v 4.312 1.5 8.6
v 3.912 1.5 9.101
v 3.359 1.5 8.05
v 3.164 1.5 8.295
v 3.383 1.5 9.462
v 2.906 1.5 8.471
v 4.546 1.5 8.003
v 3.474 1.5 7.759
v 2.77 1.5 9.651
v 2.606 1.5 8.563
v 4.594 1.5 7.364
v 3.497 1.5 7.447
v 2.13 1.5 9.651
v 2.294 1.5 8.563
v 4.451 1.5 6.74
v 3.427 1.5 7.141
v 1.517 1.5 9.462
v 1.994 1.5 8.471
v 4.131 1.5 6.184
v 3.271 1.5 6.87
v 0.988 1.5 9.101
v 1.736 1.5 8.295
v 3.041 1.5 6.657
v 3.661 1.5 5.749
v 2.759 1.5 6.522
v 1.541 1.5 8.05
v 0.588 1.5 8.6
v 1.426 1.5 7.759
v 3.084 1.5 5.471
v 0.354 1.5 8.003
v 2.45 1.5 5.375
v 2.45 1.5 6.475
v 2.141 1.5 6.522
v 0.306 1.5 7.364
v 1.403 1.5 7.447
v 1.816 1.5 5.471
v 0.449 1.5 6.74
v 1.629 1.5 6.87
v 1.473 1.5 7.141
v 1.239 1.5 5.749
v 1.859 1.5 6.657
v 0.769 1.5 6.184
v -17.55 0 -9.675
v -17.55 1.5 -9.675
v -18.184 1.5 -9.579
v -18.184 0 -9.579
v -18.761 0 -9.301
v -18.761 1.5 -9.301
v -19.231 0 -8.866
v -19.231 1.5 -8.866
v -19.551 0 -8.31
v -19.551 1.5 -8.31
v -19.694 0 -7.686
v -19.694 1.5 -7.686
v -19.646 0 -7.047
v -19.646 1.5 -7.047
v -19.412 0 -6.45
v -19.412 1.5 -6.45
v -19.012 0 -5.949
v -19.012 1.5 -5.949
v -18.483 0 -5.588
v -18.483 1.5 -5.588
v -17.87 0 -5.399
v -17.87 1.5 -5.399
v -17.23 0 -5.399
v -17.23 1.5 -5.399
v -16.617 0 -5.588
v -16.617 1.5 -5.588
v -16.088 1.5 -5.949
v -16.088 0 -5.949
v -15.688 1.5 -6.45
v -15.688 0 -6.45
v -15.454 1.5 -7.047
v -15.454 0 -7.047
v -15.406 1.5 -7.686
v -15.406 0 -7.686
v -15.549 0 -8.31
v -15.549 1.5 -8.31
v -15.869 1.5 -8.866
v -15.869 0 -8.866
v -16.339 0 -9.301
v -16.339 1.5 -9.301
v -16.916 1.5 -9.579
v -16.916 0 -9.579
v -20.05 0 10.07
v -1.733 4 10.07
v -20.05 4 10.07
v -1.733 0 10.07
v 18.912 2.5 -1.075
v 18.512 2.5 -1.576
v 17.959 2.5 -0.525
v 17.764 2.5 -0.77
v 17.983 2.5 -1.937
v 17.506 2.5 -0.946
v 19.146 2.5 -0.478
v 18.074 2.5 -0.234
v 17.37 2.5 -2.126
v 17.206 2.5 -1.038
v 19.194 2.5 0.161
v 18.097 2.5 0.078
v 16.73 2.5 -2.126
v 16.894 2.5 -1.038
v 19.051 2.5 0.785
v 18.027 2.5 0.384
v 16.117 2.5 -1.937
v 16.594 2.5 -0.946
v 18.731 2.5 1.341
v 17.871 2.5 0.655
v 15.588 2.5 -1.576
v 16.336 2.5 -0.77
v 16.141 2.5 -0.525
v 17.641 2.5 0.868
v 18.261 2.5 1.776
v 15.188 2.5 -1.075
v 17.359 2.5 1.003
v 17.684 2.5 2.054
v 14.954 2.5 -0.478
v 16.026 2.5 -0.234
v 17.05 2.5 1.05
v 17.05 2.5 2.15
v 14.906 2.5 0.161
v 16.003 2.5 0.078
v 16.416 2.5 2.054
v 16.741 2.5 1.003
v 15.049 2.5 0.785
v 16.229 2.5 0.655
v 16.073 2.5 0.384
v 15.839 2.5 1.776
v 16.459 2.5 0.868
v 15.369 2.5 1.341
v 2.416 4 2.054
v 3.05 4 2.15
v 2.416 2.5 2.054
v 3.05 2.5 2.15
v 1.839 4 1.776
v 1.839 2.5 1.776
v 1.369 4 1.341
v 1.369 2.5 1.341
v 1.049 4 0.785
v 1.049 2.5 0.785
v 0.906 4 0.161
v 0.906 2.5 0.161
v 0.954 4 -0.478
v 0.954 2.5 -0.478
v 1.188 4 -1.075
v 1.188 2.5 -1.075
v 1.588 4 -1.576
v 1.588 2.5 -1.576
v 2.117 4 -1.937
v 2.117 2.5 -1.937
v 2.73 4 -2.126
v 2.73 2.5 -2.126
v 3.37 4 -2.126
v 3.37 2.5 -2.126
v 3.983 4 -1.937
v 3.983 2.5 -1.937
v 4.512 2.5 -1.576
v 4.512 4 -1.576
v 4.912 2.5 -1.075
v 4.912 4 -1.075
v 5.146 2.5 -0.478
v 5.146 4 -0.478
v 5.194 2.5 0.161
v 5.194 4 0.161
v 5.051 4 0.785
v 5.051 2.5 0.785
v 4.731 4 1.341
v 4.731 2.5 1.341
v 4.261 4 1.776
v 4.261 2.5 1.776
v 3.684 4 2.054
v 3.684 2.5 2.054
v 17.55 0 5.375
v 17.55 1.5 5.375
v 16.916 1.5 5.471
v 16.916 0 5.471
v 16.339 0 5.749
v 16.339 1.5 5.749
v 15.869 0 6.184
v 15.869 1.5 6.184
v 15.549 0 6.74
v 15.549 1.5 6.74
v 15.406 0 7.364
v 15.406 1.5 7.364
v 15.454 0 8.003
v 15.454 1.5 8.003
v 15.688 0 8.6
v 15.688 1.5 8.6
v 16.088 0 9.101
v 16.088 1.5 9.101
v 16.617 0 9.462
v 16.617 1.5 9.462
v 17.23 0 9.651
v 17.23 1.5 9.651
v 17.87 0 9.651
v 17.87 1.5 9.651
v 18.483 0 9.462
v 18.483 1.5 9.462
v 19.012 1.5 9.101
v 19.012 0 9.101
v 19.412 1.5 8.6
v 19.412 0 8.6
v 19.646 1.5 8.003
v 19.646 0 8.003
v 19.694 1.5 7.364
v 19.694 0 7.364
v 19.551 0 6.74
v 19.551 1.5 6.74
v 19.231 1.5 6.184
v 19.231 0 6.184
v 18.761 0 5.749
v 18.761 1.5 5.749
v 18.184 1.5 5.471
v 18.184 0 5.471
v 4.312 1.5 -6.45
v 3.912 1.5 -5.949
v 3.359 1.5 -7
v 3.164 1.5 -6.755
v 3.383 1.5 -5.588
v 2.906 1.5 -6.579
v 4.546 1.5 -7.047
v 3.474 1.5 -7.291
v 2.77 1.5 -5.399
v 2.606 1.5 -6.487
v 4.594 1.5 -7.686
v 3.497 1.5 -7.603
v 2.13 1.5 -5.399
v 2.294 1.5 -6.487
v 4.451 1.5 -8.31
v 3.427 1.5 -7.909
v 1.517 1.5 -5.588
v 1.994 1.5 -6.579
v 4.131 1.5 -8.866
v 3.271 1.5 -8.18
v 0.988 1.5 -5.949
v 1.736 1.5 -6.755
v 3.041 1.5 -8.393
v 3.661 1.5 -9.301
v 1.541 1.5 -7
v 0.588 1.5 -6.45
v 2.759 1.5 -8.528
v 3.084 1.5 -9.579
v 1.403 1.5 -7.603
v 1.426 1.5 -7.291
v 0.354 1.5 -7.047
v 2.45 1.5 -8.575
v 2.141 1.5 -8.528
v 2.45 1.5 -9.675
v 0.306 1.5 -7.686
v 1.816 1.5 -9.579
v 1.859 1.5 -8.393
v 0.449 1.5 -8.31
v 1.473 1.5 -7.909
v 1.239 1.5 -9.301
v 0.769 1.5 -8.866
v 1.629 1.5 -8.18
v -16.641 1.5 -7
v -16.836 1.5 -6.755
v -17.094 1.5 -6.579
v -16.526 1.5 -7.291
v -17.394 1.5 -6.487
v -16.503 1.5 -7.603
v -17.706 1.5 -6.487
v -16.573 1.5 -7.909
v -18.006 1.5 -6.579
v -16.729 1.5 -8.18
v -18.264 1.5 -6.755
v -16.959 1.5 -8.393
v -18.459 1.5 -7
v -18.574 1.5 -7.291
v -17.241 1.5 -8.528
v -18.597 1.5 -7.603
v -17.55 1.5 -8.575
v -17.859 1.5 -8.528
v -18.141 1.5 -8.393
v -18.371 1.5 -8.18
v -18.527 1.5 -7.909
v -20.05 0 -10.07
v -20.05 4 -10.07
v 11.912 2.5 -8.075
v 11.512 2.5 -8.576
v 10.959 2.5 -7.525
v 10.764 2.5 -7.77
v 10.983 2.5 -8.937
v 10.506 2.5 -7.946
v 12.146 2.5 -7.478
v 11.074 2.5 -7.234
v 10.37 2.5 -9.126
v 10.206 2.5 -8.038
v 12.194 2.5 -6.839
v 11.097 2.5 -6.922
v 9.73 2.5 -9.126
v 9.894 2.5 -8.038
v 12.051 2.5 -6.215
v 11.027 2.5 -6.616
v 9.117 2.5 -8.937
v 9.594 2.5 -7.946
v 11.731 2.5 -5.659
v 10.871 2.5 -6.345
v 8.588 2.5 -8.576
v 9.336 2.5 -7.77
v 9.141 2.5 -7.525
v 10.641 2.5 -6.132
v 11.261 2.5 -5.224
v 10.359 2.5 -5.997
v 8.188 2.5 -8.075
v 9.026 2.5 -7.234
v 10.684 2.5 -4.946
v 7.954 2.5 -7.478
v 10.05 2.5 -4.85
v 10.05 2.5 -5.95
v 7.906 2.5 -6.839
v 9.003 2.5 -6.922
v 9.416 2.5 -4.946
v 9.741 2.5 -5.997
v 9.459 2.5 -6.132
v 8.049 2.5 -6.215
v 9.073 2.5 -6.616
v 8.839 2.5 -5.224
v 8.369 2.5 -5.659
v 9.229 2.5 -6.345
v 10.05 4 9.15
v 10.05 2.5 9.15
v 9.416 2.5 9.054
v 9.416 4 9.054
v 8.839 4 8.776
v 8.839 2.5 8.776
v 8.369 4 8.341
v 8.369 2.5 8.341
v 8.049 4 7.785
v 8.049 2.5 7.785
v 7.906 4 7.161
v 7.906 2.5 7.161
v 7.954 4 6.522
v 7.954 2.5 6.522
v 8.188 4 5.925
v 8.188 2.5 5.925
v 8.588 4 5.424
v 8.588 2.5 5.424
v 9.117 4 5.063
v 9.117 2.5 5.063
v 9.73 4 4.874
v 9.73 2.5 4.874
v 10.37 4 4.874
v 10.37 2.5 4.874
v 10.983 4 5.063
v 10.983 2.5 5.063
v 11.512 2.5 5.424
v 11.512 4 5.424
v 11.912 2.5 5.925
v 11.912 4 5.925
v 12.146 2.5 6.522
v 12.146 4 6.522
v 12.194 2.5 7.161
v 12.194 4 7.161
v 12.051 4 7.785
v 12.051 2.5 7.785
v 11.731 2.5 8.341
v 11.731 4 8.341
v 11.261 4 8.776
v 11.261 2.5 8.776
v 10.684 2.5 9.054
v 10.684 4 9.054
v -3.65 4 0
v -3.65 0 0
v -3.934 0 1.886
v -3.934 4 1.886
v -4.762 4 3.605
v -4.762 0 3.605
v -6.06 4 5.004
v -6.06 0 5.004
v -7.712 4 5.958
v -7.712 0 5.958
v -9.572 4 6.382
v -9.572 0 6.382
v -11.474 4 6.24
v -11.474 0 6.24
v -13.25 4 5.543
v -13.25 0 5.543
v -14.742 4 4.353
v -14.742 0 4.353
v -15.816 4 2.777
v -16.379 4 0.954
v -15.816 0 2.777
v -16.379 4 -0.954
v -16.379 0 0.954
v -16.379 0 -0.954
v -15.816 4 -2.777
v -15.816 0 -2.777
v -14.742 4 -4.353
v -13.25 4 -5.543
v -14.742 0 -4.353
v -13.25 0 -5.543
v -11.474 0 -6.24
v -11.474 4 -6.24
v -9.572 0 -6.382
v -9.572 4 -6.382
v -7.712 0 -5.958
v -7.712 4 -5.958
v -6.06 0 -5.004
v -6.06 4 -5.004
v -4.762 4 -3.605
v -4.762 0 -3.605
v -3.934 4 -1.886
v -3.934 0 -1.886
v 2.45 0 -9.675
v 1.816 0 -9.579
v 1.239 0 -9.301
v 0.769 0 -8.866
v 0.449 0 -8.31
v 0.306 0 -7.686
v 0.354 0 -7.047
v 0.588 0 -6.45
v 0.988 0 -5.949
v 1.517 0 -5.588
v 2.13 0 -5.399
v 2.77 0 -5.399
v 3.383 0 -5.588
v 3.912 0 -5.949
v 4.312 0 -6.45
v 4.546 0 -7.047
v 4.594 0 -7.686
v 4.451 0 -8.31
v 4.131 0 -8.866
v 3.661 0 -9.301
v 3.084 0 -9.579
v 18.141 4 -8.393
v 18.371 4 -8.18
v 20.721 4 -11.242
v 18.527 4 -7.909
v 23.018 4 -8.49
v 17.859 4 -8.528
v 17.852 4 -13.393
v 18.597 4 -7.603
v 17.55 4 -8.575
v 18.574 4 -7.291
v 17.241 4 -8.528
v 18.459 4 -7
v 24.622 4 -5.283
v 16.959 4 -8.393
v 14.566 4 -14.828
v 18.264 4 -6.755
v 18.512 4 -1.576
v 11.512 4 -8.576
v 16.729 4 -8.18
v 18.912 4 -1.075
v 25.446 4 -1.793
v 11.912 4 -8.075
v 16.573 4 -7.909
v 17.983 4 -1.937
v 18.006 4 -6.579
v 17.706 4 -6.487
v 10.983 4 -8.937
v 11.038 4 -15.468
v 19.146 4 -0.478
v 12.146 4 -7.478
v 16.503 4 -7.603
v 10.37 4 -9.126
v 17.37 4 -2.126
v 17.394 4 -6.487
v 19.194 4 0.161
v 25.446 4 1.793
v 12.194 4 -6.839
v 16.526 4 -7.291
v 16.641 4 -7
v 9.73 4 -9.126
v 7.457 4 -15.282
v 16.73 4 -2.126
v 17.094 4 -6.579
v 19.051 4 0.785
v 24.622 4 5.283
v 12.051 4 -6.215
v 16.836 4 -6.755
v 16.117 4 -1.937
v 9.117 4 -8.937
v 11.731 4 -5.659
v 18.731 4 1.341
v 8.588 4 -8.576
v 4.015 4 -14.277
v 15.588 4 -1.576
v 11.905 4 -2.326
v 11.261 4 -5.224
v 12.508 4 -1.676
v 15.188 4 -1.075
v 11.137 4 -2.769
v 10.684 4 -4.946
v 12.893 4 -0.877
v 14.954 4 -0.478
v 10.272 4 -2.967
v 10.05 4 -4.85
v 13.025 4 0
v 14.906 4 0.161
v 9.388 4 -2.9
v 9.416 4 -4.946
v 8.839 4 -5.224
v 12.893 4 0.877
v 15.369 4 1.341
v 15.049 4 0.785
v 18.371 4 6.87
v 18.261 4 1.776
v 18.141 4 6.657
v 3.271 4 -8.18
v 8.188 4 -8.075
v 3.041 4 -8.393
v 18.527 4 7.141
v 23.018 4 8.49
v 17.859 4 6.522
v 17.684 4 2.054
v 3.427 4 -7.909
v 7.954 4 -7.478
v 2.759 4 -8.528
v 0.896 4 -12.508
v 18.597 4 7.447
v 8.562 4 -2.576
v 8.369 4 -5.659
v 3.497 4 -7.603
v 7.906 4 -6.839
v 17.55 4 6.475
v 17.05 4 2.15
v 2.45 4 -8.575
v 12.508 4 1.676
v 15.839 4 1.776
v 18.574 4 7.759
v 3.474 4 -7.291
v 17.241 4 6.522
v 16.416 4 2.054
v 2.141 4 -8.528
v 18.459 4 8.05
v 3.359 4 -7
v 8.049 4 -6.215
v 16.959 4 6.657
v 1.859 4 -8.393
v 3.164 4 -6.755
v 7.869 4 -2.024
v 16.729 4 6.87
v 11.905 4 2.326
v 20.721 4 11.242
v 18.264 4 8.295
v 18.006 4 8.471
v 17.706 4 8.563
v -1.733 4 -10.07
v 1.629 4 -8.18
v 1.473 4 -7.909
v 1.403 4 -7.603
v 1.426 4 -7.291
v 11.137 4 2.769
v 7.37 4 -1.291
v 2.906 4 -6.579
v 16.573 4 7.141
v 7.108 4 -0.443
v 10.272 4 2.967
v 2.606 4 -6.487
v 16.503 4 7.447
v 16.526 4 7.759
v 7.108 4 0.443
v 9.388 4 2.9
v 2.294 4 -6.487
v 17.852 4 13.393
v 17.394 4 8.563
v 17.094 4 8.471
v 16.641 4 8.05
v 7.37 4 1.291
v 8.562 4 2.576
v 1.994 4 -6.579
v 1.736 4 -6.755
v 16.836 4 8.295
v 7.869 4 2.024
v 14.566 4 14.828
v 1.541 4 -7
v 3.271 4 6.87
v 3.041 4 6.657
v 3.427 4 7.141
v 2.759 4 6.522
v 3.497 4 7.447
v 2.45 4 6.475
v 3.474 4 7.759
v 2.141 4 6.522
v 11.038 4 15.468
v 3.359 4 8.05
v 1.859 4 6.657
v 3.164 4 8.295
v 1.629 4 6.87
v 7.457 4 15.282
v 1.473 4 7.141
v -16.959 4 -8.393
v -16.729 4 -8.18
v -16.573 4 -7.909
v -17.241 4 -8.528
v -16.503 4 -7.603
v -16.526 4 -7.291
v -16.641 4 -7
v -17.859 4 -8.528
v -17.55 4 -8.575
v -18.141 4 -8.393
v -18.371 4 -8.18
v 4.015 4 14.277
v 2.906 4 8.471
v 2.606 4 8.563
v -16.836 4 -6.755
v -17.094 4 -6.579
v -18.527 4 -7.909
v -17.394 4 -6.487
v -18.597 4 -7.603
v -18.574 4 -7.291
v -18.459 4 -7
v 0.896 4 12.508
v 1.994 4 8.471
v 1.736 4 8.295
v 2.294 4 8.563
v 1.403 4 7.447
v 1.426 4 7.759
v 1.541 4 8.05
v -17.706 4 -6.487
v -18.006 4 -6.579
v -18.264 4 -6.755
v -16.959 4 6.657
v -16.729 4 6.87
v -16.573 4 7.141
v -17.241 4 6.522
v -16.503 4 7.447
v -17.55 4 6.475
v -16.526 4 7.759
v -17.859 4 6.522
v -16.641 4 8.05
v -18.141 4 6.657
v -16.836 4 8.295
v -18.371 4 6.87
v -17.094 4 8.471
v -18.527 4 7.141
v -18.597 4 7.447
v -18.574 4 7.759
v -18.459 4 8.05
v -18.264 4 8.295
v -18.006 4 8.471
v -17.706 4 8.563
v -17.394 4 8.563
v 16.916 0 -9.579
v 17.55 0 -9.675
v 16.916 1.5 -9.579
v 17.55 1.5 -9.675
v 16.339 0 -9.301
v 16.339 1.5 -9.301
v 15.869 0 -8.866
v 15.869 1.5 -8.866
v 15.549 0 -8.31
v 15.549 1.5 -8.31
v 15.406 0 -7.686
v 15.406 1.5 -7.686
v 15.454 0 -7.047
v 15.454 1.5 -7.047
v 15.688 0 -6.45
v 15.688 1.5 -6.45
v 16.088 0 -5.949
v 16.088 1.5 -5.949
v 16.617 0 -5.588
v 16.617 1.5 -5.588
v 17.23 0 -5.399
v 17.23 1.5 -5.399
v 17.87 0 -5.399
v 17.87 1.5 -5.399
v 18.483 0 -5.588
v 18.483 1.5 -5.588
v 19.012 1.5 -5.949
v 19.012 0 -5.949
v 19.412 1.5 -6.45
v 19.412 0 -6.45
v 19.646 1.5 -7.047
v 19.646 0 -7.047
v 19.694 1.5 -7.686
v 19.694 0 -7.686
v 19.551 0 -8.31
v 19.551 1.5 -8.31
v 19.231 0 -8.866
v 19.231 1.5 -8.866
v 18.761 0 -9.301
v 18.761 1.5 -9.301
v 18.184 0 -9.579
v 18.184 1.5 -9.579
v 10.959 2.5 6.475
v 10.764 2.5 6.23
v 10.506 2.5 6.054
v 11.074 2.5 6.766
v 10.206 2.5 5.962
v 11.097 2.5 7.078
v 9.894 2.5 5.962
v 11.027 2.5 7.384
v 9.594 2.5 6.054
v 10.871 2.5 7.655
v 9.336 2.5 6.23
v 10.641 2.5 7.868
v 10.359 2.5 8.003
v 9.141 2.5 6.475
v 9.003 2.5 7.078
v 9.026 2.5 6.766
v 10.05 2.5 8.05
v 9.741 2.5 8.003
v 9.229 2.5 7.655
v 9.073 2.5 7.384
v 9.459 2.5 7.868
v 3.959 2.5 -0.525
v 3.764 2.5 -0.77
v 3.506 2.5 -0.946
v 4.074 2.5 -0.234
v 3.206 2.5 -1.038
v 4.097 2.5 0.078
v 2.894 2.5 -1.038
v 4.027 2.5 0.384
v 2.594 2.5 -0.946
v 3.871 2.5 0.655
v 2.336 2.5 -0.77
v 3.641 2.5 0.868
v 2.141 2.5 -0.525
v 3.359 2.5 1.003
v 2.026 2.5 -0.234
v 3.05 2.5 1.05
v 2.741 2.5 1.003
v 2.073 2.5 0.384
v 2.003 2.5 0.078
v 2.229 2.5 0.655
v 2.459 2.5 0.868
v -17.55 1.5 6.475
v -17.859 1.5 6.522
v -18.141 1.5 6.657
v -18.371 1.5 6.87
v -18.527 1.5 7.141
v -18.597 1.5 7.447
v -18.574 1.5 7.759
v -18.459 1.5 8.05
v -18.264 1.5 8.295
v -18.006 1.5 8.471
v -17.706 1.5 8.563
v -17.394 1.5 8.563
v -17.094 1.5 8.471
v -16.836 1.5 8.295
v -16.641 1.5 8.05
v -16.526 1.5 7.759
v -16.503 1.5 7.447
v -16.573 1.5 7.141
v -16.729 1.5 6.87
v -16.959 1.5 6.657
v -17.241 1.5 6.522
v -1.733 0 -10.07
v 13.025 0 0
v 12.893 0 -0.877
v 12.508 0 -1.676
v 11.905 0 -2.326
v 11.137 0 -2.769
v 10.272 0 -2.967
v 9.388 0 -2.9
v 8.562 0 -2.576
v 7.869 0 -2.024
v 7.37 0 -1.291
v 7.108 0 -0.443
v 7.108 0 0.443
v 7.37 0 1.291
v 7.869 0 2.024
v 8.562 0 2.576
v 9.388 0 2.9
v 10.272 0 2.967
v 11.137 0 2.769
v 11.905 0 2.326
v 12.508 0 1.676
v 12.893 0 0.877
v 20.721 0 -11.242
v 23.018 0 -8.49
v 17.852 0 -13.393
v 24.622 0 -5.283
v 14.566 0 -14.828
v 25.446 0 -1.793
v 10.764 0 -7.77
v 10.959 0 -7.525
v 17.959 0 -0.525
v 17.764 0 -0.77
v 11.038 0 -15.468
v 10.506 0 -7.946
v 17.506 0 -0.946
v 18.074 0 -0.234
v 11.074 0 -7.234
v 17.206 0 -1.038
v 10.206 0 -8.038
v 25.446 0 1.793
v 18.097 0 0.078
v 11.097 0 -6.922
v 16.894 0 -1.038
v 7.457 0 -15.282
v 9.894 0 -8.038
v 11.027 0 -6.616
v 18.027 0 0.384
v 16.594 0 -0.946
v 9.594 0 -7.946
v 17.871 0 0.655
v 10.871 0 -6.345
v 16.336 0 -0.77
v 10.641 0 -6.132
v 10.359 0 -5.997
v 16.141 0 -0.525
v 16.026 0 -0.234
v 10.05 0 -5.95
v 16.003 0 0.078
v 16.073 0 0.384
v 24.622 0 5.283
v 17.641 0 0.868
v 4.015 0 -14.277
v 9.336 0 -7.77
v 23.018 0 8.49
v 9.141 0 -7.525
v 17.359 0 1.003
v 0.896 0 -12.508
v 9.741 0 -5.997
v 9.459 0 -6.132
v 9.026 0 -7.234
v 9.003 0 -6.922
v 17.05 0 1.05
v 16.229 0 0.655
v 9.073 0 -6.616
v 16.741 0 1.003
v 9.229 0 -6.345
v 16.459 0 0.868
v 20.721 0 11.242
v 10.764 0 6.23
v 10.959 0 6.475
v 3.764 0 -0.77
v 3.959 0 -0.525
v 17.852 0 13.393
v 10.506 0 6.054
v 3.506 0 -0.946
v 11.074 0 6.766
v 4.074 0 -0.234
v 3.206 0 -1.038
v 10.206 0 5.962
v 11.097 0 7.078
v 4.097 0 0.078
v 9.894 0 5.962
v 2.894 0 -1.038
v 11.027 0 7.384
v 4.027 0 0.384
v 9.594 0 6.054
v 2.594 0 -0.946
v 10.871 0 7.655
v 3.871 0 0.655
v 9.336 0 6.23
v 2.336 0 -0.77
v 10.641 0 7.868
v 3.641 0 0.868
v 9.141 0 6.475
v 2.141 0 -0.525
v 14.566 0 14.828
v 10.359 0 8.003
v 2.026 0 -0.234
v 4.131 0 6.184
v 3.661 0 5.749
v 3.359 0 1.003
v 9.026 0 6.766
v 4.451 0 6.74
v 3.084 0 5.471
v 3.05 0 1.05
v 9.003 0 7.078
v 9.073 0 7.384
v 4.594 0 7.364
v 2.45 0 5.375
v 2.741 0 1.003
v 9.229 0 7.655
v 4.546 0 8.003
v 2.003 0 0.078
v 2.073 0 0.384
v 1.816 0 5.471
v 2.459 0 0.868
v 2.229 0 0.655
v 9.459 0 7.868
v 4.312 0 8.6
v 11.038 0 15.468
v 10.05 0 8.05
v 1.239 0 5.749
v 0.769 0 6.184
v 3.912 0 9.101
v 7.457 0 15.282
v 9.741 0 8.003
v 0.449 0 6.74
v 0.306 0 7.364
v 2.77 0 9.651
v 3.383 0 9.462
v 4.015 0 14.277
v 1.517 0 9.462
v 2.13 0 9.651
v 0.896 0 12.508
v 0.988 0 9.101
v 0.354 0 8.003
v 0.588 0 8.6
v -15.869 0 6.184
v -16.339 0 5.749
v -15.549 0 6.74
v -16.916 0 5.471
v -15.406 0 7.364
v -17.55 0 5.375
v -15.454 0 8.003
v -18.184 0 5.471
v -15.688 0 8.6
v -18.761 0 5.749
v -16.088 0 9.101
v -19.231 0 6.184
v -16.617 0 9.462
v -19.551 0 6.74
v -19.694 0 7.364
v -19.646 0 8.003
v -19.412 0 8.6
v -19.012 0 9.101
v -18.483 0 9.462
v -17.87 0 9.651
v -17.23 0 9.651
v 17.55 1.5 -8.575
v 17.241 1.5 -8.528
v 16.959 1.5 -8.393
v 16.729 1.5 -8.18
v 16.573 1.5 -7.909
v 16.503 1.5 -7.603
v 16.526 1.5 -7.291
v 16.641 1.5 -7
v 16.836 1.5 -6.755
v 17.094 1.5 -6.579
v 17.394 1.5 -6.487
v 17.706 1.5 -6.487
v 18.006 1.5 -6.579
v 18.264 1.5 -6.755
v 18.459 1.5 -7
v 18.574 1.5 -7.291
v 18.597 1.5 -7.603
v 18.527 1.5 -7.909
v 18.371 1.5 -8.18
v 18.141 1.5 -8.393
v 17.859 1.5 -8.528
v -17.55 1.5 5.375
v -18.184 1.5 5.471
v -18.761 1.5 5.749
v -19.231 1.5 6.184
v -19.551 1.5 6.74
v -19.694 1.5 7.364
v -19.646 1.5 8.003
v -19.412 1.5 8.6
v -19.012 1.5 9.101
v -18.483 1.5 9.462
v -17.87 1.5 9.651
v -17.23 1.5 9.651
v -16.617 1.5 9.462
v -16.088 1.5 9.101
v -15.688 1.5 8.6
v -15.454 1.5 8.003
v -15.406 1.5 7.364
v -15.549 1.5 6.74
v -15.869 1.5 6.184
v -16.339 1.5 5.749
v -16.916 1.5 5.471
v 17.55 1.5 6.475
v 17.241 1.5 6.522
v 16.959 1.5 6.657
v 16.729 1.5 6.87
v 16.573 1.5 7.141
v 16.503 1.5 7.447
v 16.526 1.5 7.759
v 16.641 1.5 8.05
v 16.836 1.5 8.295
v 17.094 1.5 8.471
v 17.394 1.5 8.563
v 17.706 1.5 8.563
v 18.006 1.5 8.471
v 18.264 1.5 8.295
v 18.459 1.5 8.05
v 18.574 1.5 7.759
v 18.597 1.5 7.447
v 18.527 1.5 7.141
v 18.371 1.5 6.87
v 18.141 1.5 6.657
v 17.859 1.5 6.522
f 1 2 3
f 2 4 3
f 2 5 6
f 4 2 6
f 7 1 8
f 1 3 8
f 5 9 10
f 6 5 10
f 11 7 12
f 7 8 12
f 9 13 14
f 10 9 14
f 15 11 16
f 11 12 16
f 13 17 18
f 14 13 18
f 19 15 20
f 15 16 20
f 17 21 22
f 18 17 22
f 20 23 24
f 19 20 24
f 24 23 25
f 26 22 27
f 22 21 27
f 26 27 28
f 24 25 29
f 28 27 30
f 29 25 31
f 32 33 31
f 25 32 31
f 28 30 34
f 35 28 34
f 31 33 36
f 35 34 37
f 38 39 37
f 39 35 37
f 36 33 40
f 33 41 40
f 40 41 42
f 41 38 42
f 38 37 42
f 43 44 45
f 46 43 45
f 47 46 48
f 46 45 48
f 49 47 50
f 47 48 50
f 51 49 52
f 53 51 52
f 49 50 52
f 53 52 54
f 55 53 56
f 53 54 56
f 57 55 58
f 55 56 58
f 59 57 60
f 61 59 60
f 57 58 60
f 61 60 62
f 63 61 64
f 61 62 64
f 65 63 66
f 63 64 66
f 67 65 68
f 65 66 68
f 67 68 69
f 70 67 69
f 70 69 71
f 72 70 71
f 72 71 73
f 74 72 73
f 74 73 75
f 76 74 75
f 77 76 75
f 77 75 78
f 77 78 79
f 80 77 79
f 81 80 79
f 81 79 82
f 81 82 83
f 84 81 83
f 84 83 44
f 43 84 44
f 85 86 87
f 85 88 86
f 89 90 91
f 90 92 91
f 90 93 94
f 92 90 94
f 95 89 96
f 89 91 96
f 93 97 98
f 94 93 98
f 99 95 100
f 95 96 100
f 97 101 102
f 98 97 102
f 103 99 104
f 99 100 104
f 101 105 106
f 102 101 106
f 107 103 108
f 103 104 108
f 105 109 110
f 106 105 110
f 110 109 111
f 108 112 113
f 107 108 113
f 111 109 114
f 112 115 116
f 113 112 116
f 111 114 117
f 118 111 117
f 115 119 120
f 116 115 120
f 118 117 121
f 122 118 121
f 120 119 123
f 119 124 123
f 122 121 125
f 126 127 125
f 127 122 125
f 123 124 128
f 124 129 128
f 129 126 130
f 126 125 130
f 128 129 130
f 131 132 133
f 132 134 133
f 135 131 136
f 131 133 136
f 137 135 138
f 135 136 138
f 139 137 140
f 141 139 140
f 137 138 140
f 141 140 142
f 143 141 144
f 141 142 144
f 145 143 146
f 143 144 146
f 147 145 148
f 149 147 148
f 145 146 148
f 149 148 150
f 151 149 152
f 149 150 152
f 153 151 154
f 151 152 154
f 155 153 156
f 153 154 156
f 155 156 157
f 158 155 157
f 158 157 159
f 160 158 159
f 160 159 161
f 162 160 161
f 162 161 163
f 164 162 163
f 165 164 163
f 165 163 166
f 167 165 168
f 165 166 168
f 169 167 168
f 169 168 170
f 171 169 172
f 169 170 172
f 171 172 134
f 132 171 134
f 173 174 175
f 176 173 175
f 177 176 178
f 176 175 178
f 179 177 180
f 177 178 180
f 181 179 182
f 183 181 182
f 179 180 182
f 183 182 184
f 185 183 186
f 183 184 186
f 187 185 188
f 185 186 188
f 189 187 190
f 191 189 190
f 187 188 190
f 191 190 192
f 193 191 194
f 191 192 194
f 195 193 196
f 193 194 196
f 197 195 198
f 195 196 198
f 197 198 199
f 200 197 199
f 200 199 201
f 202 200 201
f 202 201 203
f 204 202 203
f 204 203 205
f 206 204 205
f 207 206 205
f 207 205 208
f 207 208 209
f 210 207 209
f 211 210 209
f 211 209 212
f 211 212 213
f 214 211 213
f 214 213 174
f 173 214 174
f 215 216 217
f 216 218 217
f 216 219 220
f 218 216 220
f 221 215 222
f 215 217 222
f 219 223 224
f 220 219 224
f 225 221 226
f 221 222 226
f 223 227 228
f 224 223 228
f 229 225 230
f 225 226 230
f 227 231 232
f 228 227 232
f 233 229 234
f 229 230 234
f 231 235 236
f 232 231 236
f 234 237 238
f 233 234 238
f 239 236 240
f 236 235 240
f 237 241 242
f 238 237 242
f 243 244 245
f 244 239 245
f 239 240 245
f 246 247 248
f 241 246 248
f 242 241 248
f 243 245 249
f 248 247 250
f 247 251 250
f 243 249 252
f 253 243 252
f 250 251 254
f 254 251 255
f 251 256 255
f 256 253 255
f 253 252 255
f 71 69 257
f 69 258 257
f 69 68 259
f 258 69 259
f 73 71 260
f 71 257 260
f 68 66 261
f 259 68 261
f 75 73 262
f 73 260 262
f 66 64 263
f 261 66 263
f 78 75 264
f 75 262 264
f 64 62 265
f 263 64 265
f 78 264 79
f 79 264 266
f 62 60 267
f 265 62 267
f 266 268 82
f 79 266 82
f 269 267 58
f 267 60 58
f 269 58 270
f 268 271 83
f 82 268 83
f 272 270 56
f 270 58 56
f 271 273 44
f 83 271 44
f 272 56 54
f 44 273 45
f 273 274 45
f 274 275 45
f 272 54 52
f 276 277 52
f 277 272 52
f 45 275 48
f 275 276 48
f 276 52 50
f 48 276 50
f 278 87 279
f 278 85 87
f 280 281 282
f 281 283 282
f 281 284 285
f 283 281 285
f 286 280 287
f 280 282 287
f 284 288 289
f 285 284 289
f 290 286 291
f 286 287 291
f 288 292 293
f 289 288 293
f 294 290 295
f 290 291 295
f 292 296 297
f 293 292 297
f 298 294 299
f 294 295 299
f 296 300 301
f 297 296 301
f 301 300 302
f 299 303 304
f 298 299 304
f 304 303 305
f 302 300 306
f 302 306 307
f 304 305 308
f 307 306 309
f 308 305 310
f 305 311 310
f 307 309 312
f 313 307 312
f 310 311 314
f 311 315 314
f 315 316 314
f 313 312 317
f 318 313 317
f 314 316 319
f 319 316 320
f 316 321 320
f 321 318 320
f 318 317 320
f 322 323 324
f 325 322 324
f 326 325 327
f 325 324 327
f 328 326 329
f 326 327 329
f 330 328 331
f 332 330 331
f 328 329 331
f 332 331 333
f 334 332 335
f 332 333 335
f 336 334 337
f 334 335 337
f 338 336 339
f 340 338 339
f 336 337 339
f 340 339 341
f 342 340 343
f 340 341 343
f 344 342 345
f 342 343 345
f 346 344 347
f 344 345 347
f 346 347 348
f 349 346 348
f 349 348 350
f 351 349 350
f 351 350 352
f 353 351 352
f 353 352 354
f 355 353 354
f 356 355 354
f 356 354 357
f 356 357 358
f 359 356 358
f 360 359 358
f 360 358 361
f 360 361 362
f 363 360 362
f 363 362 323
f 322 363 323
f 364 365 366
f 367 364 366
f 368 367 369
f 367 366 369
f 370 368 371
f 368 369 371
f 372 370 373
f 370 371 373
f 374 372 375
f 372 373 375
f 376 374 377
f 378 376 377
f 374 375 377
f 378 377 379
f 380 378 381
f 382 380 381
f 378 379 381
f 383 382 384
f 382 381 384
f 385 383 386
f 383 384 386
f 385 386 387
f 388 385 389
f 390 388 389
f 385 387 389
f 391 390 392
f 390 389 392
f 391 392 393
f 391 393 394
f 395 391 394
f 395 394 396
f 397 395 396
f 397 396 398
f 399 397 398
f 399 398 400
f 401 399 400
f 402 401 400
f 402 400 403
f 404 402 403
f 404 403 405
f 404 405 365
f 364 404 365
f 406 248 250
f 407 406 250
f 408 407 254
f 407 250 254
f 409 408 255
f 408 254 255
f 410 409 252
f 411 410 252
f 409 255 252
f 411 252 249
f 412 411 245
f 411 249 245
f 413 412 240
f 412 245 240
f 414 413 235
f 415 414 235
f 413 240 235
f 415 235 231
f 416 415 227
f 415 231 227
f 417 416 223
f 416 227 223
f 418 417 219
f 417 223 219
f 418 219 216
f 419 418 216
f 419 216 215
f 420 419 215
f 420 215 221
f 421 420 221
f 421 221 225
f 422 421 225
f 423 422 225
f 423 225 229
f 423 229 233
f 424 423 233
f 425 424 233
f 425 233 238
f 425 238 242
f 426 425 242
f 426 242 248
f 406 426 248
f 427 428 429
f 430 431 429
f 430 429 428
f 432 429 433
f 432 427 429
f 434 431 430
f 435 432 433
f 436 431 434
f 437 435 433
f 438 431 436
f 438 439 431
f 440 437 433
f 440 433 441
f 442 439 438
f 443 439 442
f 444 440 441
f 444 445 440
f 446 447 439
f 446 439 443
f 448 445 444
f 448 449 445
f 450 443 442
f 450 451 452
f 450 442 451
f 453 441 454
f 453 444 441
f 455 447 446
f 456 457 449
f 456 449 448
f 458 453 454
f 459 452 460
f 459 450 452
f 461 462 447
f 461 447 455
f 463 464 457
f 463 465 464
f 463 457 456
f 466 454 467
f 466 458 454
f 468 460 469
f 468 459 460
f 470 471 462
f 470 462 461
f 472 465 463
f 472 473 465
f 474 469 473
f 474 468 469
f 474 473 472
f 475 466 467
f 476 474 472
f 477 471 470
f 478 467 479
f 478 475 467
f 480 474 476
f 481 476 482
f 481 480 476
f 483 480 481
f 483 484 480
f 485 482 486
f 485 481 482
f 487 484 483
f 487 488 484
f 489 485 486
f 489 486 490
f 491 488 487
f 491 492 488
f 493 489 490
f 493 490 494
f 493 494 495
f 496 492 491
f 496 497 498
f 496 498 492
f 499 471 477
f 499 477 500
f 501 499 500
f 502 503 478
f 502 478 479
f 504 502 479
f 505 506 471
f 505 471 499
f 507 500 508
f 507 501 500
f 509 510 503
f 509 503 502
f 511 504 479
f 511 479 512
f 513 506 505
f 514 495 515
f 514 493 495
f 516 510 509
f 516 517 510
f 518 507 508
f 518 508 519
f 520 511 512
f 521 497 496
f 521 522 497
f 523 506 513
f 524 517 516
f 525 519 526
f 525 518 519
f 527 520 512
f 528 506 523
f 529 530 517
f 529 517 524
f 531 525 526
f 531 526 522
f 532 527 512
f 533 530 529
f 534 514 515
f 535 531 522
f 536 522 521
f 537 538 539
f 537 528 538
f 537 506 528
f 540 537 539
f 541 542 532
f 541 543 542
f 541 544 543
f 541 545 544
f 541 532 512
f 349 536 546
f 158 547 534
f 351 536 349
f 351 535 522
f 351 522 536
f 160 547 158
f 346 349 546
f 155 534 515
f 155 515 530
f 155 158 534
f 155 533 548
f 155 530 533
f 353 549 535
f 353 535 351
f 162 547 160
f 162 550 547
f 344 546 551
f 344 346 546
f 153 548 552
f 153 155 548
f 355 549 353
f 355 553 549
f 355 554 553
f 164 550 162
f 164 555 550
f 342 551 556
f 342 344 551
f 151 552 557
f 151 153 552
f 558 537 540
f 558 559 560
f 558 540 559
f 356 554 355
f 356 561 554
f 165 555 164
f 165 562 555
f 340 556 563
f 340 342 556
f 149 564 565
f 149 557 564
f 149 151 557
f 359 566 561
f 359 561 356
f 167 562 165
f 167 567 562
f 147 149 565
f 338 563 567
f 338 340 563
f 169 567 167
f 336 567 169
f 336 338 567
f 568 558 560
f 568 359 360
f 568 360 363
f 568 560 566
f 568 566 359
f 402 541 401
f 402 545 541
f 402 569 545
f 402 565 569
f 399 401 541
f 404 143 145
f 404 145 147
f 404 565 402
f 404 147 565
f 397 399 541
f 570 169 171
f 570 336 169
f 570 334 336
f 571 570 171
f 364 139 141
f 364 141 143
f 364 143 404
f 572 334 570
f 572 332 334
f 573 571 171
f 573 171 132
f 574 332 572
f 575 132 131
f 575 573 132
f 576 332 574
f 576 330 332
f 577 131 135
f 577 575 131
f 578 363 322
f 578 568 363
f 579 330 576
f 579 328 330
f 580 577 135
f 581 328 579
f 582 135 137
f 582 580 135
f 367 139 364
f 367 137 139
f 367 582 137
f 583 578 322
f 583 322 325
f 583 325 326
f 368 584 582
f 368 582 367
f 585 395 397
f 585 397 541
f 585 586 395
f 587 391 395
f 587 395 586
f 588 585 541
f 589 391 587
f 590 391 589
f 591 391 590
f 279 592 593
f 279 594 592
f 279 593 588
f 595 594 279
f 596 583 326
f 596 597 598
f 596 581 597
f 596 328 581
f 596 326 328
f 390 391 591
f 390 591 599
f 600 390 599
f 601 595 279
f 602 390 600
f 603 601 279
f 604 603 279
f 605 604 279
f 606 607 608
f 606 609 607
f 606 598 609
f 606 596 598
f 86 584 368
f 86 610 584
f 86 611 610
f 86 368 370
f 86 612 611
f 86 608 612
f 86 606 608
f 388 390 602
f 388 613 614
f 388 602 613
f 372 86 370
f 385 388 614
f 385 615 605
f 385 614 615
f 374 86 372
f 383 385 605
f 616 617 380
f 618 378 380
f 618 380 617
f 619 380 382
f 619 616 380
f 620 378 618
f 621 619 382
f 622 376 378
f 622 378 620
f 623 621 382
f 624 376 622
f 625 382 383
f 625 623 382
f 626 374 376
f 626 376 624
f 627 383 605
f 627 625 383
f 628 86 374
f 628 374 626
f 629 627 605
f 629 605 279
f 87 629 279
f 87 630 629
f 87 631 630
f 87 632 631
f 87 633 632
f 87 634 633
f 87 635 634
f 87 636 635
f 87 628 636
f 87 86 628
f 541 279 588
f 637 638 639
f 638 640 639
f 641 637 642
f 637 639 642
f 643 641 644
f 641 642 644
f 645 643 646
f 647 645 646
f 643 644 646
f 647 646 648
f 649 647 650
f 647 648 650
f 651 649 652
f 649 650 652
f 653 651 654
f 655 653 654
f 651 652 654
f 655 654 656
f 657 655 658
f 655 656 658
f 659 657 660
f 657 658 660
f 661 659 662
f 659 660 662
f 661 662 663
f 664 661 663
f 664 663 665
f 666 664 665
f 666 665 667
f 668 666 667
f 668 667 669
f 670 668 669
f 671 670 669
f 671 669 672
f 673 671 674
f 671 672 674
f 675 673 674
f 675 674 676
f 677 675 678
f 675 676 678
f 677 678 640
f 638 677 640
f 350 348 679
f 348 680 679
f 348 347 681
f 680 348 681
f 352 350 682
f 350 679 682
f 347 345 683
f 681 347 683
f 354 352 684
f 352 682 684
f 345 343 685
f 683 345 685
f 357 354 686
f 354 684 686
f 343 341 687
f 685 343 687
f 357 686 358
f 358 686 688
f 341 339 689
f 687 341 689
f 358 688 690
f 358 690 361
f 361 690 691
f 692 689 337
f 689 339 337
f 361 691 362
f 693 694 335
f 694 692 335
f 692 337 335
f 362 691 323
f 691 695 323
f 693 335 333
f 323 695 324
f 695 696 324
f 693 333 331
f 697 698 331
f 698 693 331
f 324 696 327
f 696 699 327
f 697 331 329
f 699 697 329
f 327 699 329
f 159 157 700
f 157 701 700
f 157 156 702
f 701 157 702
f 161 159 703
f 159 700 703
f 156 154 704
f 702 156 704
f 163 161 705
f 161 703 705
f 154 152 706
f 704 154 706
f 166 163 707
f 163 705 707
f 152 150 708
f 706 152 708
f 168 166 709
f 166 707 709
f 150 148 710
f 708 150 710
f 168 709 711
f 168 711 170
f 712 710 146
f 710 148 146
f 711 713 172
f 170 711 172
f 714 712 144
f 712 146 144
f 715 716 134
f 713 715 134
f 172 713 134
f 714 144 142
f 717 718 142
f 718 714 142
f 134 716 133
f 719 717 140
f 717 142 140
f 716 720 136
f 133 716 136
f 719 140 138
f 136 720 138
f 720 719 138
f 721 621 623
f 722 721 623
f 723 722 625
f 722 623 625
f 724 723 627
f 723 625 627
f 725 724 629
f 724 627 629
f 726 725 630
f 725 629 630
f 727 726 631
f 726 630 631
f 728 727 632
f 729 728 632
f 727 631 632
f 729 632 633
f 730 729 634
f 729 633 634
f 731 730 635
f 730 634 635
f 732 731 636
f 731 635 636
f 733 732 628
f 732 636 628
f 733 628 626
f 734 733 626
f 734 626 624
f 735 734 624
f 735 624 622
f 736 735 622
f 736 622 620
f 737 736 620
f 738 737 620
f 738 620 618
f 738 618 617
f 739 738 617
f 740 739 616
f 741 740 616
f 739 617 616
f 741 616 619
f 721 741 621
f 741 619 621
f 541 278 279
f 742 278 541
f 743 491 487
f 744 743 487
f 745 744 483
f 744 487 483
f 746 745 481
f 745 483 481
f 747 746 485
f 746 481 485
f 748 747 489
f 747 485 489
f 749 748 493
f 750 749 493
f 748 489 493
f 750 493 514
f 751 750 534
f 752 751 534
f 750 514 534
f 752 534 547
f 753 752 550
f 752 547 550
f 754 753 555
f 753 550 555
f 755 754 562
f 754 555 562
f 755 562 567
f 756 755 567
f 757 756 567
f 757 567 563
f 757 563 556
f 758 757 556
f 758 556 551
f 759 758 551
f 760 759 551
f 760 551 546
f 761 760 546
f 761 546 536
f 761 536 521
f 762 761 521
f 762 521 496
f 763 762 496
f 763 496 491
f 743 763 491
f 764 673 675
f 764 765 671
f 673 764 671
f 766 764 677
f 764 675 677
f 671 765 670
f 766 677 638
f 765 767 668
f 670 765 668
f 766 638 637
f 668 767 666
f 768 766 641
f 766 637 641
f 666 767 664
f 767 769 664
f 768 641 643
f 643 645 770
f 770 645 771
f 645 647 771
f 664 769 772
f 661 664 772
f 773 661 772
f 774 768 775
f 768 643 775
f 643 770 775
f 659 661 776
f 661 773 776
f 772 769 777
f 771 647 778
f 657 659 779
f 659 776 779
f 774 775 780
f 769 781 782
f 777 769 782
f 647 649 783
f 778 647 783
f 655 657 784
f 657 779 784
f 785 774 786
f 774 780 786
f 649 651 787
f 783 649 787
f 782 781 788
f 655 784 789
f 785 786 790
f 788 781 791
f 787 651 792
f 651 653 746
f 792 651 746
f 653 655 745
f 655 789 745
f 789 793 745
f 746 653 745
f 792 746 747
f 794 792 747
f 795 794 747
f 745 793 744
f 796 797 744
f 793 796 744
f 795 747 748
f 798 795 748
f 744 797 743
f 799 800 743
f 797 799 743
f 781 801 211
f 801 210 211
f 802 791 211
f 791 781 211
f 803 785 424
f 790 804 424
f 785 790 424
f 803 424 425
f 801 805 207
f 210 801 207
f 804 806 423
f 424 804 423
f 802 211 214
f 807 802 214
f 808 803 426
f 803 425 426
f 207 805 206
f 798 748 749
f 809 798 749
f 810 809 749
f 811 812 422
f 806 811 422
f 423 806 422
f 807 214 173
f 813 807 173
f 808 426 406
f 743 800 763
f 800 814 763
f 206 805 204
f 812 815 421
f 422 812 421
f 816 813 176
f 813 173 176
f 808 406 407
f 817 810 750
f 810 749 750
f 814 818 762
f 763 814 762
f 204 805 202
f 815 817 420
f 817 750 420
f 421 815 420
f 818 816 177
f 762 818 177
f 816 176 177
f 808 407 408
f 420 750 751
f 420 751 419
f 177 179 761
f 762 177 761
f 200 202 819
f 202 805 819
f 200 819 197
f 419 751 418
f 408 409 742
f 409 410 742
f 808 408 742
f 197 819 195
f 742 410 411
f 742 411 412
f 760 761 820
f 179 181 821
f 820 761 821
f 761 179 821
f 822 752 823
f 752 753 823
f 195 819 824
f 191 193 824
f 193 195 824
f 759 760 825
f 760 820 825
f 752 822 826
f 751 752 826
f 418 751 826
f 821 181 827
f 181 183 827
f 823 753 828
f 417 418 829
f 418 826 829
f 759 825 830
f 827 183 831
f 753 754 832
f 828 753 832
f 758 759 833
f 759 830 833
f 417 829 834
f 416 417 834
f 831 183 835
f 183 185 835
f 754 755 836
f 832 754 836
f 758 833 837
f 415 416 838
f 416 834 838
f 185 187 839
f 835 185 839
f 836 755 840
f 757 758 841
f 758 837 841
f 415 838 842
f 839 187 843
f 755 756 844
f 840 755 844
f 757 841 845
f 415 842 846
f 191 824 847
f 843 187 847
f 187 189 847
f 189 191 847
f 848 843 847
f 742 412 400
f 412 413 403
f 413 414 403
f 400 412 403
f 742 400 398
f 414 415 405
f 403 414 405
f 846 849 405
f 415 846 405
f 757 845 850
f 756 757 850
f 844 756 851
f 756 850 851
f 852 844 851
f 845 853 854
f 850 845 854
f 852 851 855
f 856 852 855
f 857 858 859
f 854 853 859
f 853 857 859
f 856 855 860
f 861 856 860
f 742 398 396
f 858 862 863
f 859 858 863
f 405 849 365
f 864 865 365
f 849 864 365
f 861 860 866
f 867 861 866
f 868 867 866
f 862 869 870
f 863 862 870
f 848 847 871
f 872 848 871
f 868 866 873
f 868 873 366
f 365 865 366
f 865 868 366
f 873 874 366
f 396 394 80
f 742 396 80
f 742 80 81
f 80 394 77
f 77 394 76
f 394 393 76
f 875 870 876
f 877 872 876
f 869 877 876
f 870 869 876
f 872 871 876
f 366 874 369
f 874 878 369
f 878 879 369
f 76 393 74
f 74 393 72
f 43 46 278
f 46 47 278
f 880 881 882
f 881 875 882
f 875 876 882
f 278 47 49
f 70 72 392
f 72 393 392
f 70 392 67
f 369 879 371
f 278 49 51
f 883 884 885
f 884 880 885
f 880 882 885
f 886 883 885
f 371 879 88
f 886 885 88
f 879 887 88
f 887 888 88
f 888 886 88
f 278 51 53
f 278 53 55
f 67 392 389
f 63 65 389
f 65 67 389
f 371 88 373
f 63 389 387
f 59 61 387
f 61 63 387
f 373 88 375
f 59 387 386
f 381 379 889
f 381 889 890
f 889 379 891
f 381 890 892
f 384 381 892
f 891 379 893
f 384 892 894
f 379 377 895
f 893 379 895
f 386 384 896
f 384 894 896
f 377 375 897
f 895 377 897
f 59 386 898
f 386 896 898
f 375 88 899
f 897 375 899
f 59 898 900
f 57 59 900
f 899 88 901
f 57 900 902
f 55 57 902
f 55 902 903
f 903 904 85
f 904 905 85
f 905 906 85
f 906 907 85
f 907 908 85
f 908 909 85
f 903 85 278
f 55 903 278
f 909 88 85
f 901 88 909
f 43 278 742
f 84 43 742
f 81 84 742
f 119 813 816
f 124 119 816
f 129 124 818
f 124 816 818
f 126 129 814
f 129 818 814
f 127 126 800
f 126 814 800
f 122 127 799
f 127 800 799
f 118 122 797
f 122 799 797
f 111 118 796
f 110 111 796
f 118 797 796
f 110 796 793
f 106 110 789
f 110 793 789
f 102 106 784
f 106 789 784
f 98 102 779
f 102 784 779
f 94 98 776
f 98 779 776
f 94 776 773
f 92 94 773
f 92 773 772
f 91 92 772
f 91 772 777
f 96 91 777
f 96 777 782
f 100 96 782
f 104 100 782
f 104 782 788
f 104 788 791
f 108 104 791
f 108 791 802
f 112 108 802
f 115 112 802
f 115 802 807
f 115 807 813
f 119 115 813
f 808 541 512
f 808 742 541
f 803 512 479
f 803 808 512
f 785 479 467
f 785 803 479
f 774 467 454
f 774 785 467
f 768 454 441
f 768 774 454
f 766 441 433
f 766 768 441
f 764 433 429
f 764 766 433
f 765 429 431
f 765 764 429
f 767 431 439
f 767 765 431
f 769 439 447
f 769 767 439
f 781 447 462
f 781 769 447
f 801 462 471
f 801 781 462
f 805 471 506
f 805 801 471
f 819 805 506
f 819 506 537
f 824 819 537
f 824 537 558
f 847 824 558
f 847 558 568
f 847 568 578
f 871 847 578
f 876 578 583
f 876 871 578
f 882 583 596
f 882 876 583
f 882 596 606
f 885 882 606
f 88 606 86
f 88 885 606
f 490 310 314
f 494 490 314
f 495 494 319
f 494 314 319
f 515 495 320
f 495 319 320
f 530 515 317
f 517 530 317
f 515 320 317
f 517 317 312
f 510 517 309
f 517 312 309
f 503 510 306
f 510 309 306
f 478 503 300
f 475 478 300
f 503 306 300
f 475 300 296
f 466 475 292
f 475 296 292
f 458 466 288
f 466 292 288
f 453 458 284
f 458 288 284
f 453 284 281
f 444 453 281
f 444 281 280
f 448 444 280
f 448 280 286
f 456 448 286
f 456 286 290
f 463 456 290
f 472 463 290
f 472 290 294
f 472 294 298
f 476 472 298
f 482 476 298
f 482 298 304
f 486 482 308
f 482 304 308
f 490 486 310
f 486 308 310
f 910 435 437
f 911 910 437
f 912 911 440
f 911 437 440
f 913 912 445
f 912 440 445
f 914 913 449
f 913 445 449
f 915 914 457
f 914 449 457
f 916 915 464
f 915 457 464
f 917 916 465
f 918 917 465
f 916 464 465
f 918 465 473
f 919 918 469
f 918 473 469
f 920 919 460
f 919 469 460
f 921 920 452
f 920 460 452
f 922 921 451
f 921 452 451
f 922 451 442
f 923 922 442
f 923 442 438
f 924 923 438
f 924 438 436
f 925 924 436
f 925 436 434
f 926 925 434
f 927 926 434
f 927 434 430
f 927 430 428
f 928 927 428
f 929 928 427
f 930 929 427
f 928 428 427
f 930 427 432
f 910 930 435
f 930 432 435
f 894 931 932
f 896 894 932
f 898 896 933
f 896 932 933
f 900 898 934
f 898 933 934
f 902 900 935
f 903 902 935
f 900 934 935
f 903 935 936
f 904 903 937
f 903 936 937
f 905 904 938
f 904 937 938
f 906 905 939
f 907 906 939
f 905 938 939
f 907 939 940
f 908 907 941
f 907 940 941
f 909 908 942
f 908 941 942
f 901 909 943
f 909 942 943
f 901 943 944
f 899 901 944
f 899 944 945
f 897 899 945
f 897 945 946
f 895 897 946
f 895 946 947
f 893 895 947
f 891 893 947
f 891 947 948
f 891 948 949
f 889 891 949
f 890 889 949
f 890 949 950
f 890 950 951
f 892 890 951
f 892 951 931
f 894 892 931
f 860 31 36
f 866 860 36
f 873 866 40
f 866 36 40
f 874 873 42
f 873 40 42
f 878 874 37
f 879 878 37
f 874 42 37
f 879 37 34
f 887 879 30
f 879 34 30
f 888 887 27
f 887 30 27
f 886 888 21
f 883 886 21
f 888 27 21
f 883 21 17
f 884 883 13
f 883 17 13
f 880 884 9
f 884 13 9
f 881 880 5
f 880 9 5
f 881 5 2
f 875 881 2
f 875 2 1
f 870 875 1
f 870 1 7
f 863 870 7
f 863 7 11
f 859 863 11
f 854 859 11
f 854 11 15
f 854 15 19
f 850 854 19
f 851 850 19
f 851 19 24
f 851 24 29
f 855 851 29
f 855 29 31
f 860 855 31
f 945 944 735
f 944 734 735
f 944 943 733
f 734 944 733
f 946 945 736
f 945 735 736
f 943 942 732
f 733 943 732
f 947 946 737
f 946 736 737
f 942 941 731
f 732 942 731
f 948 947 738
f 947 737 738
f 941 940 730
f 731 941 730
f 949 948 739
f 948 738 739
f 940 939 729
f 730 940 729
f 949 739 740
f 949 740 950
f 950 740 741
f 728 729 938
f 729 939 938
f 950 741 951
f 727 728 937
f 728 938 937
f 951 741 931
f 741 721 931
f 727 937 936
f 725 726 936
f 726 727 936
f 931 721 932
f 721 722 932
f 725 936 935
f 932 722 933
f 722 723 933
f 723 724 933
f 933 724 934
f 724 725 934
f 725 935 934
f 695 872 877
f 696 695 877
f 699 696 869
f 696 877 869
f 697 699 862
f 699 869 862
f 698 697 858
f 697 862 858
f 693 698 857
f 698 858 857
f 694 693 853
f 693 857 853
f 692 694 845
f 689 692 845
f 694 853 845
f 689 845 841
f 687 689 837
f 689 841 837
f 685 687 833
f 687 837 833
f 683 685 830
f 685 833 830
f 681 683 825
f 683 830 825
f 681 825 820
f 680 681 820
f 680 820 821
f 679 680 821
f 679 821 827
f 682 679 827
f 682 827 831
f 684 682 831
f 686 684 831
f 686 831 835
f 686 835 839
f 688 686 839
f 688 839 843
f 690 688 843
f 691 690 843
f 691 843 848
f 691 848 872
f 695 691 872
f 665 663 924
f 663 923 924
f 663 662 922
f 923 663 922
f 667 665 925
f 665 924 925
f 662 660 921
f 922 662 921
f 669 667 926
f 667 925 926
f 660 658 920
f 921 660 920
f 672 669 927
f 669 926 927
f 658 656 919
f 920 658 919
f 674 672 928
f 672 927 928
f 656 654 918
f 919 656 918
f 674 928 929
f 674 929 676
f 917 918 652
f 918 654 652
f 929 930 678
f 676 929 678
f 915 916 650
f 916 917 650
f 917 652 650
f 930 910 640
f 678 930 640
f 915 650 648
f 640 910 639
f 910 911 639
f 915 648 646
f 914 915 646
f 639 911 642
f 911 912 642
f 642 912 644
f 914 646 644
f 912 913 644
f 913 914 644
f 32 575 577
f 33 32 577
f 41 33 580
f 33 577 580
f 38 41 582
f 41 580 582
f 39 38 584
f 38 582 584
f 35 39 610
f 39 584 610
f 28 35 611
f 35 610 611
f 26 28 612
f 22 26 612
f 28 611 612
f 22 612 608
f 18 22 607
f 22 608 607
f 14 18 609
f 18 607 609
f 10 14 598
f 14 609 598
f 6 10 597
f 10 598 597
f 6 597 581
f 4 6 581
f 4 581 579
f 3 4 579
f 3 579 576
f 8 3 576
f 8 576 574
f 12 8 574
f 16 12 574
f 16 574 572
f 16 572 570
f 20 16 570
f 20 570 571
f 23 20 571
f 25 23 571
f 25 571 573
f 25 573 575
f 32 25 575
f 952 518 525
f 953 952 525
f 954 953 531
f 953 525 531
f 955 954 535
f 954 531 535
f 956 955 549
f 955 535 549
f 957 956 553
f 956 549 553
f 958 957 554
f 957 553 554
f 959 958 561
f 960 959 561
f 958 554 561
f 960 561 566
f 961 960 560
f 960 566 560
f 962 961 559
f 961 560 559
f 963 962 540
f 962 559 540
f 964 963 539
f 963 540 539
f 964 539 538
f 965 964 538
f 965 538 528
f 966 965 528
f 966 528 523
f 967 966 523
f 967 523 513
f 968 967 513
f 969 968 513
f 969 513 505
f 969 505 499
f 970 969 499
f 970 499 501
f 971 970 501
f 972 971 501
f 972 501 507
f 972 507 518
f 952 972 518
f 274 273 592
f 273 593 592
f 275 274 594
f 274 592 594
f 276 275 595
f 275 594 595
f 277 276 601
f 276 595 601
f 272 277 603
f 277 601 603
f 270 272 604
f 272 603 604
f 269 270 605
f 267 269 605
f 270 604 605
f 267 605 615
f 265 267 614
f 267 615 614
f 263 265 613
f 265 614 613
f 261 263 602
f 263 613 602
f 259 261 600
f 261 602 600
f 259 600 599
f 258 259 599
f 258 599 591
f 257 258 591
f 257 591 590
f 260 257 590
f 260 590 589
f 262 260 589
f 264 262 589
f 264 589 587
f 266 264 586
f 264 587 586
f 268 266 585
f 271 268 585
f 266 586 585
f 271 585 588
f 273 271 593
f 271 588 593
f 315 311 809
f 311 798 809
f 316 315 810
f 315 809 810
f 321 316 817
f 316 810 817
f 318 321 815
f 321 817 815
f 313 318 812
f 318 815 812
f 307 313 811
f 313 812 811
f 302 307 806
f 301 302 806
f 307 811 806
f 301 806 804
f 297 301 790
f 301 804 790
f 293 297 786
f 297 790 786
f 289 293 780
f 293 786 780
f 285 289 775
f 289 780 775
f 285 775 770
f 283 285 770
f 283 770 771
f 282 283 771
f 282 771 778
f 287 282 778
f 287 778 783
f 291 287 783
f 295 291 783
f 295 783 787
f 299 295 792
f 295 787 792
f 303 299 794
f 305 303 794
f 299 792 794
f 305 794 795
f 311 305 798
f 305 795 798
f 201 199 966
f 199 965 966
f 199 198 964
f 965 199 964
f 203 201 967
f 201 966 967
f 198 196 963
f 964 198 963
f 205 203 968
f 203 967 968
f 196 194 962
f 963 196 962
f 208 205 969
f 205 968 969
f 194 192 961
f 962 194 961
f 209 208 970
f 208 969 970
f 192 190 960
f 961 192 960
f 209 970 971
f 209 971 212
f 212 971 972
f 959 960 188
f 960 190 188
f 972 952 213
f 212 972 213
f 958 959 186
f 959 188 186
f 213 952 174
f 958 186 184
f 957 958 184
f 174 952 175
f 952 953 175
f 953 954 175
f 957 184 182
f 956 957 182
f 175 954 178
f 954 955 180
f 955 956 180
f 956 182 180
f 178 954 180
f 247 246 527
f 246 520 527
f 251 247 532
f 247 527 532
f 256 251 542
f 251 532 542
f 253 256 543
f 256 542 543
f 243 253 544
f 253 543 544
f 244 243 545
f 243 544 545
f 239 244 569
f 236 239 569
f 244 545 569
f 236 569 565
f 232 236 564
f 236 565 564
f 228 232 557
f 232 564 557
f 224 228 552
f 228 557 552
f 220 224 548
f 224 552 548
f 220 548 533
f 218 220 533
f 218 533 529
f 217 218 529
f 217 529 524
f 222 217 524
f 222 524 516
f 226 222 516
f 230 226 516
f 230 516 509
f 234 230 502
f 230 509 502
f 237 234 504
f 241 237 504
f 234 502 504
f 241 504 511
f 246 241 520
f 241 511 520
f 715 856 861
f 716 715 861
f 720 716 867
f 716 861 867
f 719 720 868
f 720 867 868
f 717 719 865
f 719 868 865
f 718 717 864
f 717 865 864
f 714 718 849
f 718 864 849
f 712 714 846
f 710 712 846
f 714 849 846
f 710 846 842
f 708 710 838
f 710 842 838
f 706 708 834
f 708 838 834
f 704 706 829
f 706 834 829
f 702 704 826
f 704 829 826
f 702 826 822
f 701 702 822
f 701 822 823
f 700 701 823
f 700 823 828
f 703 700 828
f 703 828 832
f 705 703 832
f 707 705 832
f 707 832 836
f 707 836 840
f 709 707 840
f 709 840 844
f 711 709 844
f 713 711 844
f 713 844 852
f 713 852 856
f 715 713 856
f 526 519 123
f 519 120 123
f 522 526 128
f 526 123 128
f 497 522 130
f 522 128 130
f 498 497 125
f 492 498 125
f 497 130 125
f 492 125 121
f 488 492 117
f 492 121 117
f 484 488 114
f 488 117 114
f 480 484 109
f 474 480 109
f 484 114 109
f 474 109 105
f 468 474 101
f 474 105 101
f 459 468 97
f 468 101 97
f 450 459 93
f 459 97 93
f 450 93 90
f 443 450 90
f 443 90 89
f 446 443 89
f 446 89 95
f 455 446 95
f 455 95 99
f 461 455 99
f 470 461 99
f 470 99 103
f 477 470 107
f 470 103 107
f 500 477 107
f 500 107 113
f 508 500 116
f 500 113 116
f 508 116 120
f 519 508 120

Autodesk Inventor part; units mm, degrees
ref_plane "YZ Plane" through (0, 0, 0) normal (1, 0, 0) x (0, 1, 0)
ref_plane "XZ Plane" through (0, 0, 0) normal (0, 1, 0) x (-1, 0, 0)
ref_plane "XY Plane" through (0, 0, 0) normal (0, 0, 1) x (1, 0, 0)
sketch "Sketch1" plane through (0, 0, 0) normal (0, 1, 0) x (-1, 0, 0)
  line L0 (20.05, -10.07) -> (-20.05, -10.07)
  line L1 (-20.05, -10.07) -> (-20.05, 10.07)
  line L2 (-20.05, 10.07) -> (20.05, 10.07)
  line L3 (20.05, 10.07) -> (20.05, -10.07)
  point P0 (0, 0)
  point P1 (0, -10.07)
  point P2 (20.05, 0)
  dimension "d0" = 40.1
  dimension "d1" = 20.14
extrude "Extrusion1" add sketch "Sketch1" along normal blind 4
sketch "Sketch3" plane through (0, 0, 0) normal (0, -1, 0) x (1, 0, 0)
  ellipse E0 centre (-17.932, 7.952) end of major axis (-18.798, 8.818) minor radius 1 (-18.1556, 9.07) -> (-19.05, 8.1756) ccw projected
  line L0 (-19.05, -8.1756) -> (-19.05, 8.1756) projected
  ellipse E1 centre (-17.932, -7.952) end of major axis (-18.798, -8.818) minor radius 1 (-19.05, -8.1756) -> (-18.1556, -9.07) ccw projected
  line L1 (18.1556, -9.07) -> (-18.1556, -9.07) projected
  ellipse E2 centre (17.932, -7.952) end of major axis (18.798, -8.818) minor radius 1 (18.1556, -9.07) -> (19.05, -8.1756) ccw projected
  line L2 (19.05, 8.1756) -> (19.05, -8.1756) projected
  ellipse E3 centre (17.932, 7.952) end of major axis (18.798, 8.818) minor radius 1 (19.05, 8.1756) -> (18.1556, 9.07) ccw projected
  line L3 (-18.1556, 9.07) -> (18.1556, 9.07) projected
  circle A0 centre (17.55, -7.525) radius 0.7835 projected
  circle A1 centre (17.55, 7.525) radius 0.7835 projected
  circle A2 centre (2.45, -7.525) radius 0.7835 projected
  circle A3 centre (2.45, 7.525) radius 0.7835 projected
  circle A4 centre (-17.55, -7.525) radius 0.7835 projected
  circle A5 centre (-17.55, 7.525) radius 0.7835 projected
  circle A6 centre (-10.05, 0) radius 6.4 projected
  circle A7 centre (-10.05, 0) radius 6.5
  point P0 (0, 0)
  dimension "d11" = 13
extrude "Extrusion2" cut sketch "Sketch3" against normal through all contours A6
sketch "Sketch7" plane through (0, 0, 0) normal (0, -1, 0) x (1, 0, 0)
  line L0 (16.15, -10.17) -> (-0.9759, -10.17) projected
  arc A0 (-0.9759, -10.17) -> (-0.9759, 10.17) centre (10.05, 0) ccw projected
  line L1 (-0.9759, 10.17) -> (16.15, 10.17) projected
  line L2 (16.15, 10.17) -> (16.15, 8.07) projected
  arc A1 (16.15, 8.07) -> (18.05, 6.17) centre (18.05, 8.07) ccw projected
  line L3 (18.05, 6.17) -> (20.15, 6.17) projected
  line L4 (20.15, 6.17) -> (20.15, -6.17) projected
  line L5 (20.15, -6.17) -> (18.05, -6.17) projected
  arc A2 (18.05, -6.17) -> (16.15, -8.07) centre (18.05, -8.07) ccw projected
  line L6 (16.15, -8.07) -> (16.15, -10.17) projected
  circle A3 centre (10.05, 0) radius 15.5
  circle A4 centre (-10.05, 0) radius 6.4 projected
  circle A5 centre (-10.05, 0) radius 6.4
  point P0 (0, 0)
  point P1 (-4.9575, 3.8763)
  point P2 (-4.9575, -3.8763)
  dimension "d31" = 31
extrude "Extrusion4" add sketch "Sketch7" against normal up to surface (4 mm away) contours L6 A2 L5 L4 L3 A1 L2 L1 A0 L0 | A3 A4 picked at (9.8263, 0)
sketch "Sketch8" plane through (0, 4, 0) normal (0, 1, 0) x (1, 0, 0)
  circle A0 centre (10.05, 7) radius 0.7835 projected
  circle A1 centre (17.05, 0) radius 0.7835 projected
  circle A2 centre (10.05, -7) radius 0.7835 projected
  circle A3 centre (3.05, 0) radius 0.7835 projected
  circle A4 centre (10.05, 0) radius 1.75 projected
  circle A5 centre (10.05, 0) radius 9.96 projected
  point P0 (0, 0)
hole "Hole4" at (10.05, 4, 7) at (3.05, 4, 0) at (17.05, 4, 0) at (10.05, 4, -7) direction (0, -1, 0) diameter 2.1 end through all counterbore diameter 4.3 counterbore depth 1.5
sketch "Sketch9" plane through (0, 4, 0) normal (0, 1, 0) x (1, 0, 0)
  circle A0 centre (10.05, 0) radius 4.5 projected
  circle A1 centre (10.05, 0) radius 2.925 projected
  circle A2 centre (10.05, 0) radius 2.975
  point P0 (0, 0)
  dimension "d41" = 5.95
extrude "Extrusion5" cut sketch "Sketch9" against normal through all contours A1 | A2
sketch "Sketch10" plane through (0, 0, 0) normal (0, -1, 0) x (1, 0, 0)
  ellipse E0 centre (-17.932, 7.952) end of major axis (-18.798, 8.818) minor radius 1 (-18.1556, 9.07) -> (-19.05, 8.1756) ccw projected
  line L0 (-19.05, -8.1756) -> (-19.05, 8.1756) projected
  ellipse E1 centre (-17.932, -7.952) end of major axis (-18.798, -8.818) minor radius 1 (-19.05, -8.1756) -> (-18.1556, -9.07) ccw projected
  line L1 (18.1556, -9.07) -> (-18.1556, -9.07) projected
  ellipse E2 centre (17.932, -7.952) end of major axis (18.798, -8.818) minor radius 1 (18.1556, -9.07) -> (19.05, -8.1756) ccw projected
  line L2 (19.05, 8.1756) -> (19.05, -8.1756) projected
  ellipse E3 centre (17.932, 7.952) end of major axis (18.798, 8.818) minor radius 1 (19.05, 8.1756) -> (18.1556, 9.07) ccw projected
  line L3 (-18.1556, 9.07) -> (18.1556, 9.07) projected
  circle A0 centre (17.55, -7.525) radius 0.7835 projected
  circle A1 centre (17.55, 7.525) radius 0.7835 projected
  circle A2 centre (2.45, -7.525) radius 0.7835 projected
  circle A3 centre (2.45, 7.525) radius 0.7835 projected
  circle A4 centre (-17.55, -7.525) radius 0.7835 projected
  circle A5 centre (-17.55, 7.525) radius 0.7835 projected
  circle A6 centre (-10.05, 0) radius 6.4 projected
  point P0 (0, 0)
hole "Hole5" at (17.55, 0, -7.525) at (2.45, 0, -7.525) at (-17.55, 0, -7.525) at (17.55, 0, 7.525) at (2.45, 0, 7.525) at (-17.55, 0, 7.525) direction (0, 1, 0) diameter 2.1 end through all counterbore diameter 4.3 counterbore depth 1.5
properties part number "gripper_6&7_connector" material "Aluminum 6061-AHC"
